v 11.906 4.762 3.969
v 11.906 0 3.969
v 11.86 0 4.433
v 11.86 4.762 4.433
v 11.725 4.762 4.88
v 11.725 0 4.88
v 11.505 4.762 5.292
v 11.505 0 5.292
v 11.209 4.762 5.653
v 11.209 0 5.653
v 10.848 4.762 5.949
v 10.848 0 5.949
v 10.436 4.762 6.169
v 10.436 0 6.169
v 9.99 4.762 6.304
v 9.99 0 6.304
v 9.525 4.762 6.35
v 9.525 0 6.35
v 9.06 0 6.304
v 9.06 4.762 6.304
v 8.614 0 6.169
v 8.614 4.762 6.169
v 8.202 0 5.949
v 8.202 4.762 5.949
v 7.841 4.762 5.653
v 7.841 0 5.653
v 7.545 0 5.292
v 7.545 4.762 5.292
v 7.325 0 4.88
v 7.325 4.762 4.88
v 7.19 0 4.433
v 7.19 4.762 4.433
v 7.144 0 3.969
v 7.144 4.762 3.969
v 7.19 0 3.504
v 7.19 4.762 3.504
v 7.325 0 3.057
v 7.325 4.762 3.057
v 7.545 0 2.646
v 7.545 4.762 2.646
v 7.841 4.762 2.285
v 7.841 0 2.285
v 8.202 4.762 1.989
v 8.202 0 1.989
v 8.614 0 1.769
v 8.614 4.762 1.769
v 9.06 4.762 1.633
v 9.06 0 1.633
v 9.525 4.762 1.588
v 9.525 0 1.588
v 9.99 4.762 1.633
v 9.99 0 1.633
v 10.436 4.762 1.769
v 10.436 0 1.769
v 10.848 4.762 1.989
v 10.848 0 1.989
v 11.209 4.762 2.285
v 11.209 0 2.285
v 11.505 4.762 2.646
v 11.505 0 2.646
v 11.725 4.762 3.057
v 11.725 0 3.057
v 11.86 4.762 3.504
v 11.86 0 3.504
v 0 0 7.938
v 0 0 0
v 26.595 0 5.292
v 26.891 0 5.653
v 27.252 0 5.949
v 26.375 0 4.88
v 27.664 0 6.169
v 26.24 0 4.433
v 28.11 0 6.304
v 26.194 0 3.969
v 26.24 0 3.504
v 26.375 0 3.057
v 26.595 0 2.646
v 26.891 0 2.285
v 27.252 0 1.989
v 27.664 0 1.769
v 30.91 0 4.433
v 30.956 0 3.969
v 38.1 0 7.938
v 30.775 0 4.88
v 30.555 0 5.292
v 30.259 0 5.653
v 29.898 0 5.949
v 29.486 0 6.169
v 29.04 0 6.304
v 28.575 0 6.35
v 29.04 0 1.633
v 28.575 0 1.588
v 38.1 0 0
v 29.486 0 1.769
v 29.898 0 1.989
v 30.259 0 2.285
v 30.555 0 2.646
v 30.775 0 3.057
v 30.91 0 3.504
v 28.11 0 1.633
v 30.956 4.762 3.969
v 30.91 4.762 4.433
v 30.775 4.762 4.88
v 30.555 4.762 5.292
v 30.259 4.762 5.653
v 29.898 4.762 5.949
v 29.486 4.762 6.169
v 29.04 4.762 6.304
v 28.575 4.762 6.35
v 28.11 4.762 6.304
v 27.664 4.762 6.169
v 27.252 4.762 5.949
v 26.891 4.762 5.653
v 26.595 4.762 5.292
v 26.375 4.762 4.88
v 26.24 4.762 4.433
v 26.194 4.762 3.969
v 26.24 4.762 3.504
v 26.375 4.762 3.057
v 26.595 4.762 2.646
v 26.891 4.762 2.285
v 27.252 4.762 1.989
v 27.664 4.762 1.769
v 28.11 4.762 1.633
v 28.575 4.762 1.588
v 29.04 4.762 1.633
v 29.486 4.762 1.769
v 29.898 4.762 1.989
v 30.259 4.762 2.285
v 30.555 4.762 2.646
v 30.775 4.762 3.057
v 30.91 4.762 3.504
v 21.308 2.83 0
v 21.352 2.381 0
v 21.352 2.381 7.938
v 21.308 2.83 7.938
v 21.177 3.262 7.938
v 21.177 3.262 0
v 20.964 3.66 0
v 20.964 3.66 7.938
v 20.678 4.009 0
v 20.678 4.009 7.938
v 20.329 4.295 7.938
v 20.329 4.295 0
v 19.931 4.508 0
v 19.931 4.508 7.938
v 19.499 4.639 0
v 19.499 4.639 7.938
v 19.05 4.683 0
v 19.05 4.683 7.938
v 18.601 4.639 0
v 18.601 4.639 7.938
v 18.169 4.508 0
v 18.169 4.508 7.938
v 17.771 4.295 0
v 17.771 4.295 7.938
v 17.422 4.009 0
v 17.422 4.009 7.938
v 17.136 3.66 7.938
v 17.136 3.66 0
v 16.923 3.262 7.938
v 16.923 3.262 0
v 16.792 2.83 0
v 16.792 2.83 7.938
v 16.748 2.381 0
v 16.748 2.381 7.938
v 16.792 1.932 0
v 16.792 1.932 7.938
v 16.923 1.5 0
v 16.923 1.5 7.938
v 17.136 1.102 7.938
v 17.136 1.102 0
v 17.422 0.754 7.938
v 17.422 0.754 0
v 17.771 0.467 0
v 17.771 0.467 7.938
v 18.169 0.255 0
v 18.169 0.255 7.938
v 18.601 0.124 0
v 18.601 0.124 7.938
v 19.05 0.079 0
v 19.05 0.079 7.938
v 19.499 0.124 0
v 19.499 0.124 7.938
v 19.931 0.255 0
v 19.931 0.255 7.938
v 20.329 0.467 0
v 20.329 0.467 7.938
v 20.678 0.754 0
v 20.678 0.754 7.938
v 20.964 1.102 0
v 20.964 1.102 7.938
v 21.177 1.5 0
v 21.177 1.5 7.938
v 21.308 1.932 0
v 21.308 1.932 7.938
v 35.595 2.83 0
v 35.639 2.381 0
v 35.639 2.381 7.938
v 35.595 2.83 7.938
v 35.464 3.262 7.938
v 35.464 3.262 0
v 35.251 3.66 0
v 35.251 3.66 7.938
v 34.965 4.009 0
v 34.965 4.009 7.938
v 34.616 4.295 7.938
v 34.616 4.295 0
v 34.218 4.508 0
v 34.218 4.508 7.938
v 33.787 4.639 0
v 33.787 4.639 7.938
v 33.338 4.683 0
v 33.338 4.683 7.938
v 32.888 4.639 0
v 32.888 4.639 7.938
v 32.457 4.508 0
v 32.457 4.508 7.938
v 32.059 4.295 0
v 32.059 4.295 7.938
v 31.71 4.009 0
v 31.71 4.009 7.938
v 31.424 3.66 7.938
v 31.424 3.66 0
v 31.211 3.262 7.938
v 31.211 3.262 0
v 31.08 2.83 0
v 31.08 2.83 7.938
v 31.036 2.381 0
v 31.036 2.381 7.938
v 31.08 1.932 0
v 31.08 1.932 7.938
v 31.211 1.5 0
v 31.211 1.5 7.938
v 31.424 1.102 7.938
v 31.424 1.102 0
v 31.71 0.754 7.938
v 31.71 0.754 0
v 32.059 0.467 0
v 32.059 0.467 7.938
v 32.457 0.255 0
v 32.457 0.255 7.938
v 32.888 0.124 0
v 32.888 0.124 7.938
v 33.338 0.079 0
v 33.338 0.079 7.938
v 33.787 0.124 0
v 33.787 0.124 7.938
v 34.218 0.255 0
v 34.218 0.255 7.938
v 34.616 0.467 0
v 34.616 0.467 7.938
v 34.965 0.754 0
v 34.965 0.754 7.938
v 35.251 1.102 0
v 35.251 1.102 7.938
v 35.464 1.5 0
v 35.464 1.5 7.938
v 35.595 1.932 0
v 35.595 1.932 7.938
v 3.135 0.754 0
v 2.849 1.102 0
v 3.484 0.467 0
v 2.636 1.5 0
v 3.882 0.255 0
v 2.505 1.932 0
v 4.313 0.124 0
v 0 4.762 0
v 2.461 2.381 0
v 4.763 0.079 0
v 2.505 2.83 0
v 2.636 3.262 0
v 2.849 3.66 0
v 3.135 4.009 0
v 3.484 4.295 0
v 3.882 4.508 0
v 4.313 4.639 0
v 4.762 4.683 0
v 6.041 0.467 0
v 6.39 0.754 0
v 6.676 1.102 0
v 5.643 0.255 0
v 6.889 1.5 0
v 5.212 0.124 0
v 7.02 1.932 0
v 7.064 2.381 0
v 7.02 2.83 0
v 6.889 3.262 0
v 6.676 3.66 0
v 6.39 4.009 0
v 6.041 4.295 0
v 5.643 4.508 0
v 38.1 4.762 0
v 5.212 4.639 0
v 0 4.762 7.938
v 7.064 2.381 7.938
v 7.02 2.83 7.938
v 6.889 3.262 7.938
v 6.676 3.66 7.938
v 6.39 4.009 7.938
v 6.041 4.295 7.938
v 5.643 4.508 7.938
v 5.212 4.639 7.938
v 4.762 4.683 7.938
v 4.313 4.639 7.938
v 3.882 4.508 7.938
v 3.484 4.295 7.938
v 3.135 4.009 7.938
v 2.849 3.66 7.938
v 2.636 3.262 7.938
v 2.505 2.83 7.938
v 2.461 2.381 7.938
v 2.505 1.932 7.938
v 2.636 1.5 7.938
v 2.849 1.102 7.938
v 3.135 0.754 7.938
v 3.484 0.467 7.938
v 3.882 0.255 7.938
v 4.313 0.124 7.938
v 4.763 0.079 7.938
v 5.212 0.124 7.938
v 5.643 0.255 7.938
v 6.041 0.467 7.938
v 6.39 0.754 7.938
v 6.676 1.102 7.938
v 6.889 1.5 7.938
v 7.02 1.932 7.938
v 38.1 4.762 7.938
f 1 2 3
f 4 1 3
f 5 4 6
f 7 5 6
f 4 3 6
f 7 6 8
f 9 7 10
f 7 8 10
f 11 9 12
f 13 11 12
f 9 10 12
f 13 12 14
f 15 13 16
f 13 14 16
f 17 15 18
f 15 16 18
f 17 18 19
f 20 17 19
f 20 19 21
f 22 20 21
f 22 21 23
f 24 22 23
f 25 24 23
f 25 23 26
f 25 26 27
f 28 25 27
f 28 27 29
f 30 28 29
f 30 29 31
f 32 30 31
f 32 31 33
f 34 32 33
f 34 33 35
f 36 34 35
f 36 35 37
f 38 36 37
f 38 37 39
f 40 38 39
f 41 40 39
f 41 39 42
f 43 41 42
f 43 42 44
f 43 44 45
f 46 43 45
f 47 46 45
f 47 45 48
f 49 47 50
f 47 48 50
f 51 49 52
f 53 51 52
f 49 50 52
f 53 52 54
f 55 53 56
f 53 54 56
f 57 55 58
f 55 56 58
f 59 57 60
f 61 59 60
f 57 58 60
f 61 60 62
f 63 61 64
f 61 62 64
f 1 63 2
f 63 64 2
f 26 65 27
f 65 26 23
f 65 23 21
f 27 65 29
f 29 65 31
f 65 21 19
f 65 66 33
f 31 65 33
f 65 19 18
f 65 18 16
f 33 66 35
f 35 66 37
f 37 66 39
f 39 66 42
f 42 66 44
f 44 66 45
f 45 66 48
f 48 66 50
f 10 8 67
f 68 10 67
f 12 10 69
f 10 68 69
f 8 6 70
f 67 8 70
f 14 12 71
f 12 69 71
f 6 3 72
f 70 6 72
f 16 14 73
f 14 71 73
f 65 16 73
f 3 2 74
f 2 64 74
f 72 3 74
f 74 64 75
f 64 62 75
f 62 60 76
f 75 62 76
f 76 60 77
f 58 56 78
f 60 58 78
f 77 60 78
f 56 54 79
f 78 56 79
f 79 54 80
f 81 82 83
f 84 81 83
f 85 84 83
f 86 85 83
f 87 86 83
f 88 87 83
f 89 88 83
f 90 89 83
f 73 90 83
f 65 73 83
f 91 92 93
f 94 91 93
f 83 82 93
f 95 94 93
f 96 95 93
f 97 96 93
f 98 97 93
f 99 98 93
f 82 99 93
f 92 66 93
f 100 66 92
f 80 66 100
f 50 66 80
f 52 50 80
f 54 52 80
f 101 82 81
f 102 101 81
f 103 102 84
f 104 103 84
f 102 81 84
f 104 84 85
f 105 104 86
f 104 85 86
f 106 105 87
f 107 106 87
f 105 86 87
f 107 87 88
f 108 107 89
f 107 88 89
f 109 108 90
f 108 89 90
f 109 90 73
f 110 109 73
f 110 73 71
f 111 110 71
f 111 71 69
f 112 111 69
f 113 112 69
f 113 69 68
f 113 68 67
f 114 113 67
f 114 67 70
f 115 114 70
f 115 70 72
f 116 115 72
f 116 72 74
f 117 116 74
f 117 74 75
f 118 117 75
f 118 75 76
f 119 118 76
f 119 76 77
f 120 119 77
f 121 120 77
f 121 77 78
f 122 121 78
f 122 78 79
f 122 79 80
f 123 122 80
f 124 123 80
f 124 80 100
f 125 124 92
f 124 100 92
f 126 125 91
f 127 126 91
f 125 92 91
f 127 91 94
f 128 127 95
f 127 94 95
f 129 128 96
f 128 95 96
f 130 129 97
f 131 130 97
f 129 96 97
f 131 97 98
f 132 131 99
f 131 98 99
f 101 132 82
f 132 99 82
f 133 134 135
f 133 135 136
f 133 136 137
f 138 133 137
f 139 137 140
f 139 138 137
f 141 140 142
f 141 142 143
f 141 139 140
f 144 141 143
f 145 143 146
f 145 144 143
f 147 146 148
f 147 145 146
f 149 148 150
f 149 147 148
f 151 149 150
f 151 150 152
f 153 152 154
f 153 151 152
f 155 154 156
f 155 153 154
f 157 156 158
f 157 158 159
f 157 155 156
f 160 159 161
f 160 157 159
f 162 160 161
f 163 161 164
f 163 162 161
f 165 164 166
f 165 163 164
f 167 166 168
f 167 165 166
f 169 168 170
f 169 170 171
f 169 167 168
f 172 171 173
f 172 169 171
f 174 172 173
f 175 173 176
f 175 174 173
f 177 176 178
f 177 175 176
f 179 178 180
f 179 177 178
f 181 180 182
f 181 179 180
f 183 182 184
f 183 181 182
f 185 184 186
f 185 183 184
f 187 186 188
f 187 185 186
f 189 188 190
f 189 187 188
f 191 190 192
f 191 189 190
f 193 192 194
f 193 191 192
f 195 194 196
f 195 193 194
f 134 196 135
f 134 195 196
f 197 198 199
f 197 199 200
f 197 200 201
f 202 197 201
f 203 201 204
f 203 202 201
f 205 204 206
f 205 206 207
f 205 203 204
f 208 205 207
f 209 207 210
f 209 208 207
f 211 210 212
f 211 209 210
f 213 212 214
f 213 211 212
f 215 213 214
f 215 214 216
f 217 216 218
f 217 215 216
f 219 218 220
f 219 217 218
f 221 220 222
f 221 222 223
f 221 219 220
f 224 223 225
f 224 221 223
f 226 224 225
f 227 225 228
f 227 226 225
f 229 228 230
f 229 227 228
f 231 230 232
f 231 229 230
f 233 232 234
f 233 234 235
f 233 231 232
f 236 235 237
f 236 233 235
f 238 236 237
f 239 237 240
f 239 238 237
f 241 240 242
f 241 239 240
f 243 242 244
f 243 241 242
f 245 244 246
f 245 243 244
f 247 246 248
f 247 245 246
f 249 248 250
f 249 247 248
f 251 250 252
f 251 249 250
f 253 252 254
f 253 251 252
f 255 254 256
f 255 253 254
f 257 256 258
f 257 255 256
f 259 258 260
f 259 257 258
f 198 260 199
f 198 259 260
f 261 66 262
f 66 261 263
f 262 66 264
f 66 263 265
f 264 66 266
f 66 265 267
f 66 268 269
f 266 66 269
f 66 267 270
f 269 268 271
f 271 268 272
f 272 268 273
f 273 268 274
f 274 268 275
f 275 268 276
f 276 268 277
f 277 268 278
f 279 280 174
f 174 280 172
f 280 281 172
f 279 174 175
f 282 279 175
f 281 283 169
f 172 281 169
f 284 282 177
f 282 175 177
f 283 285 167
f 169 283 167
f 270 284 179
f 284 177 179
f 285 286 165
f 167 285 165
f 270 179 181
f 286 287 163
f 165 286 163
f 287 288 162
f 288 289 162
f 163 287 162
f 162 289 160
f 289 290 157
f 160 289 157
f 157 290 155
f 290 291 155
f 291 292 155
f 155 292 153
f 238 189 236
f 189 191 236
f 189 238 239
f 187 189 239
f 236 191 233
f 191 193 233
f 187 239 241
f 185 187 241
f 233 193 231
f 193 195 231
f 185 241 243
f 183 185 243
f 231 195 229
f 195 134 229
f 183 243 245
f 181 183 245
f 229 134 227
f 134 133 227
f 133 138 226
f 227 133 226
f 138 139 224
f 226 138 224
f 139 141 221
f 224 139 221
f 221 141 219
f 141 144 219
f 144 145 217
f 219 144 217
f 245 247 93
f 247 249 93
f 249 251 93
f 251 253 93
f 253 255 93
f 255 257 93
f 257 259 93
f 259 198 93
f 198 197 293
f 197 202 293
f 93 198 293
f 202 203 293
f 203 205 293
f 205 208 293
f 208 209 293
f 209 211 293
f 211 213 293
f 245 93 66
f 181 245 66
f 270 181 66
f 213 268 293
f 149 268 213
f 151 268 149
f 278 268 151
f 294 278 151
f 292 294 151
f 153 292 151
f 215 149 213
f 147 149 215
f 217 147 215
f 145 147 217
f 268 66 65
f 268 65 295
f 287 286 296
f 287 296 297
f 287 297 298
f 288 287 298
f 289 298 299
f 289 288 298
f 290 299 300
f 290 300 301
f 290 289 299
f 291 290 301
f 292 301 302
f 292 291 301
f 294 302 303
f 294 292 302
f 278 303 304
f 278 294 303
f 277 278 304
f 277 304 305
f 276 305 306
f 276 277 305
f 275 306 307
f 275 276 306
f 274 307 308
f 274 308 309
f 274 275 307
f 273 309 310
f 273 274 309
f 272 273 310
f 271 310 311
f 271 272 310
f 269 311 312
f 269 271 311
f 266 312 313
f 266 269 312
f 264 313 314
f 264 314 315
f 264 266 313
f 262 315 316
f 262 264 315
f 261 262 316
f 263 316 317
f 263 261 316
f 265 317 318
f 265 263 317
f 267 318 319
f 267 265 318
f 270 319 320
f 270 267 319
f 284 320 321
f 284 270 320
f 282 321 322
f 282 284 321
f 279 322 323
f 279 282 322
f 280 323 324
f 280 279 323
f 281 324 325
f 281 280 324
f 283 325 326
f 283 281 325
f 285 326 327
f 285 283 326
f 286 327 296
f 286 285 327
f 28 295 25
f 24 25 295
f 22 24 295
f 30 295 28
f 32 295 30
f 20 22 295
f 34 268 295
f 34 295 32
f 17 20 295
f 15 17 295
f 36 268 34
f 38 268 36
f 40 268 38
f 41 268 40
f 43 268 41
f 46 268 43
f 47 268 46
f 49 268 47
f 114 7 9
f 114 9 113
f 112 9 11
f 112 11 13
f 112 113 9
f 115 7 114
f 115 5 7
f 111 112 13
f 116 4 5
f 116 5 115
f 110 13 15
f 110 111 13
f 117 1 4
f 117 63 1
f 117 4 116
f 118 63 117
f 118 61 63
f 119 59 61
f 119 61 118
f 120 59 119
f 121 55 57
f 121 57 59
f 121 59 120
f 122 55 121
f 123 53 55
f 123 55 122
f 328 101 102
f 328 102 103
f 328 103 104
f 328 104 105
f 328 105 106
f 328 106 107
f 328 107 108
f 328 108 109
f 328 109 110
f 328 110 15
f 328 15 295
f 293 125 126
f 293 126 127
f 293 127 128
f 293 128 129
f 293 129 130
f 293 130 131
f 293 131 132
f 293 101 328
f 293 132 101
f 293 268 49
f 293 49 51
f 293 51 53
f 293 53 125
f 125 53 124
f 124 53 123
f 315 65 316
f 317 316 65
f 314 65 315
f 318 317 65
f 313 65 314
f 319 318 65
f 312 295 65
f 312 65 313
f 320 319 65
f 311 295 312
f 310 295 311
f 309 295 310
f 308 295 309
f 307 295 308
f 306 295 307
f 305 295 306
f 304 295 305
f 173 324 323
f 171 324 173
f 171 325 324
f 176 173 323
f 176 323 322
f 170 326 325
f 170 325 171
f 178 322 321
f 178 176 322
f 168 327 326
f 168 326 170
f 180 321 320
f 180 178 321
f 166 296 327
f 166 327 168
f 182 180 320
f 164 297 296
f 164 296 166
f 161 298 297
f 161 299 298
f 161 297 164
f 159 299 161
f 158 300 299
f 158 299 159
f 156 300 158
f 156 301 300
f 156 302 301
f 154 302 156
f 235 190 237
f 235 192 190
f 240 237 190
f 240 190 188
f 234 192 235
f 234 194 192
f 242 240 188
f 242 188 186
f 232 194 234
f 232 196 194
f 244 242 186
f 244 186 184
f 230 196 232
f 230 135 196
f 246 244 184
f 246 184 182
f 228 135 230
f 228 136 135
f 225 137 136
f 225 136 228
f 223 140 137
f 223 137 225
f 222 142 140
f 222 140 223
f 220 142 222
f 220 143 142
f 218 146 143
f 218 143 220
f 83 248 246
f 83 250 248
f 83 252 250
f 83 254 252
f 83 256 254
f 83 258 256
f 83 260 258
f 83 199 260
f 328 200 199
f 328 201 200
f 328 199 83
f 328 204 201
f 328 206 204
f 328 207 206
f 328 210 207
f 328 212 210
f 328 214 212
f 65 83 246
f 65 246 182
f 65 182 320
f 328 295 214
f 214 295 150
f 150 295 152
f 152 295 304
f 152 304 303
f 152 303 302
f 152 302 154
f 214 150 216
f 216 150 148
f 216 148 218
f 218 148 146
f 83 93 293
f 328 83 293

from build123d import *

# Parameters (mm, degrees)
F0_W     = 38.1
F0_H     = 4.7625
F0_R     = 2.301875
F1_DEPTH = 7.9375
F2_R     = 2.38125
F3_DEPTH = 25.4


with BuildPart() as f1:
    # F0 (on Top) → F1 (new body)
    with BuildSketch(Plane.XY):
        with Locations((19.05, 2.38125)):
            Rectangle(F0_W, F0_H)
        with Locations((4.7625, 2.38125)):
            Circle(F0_R, mode=Mode.SUBTRACT)
        with Locations((19.05, 2.38125)):
            Circle(F0_R, mode=Mode.SUBTRACT)
        with Locations((33.3375, 2.38125)):
            Circle(F0_R, mode=Mode.SUBTRACT)
    extrude(amount=F1_DEPTH)

    # F2 (on face) → F3 (cut)
    with BuildSketch(Plane.XZ):
        with Locations((28.575, 3.96875)):
            Circle(F2_R)
        with Locations((9.525, 3.96875)):
            Circle(F2_R)
    extrude(amount=-F3_DEPTH, mode=Mode.SUBTRACT)


solid = f1.part
